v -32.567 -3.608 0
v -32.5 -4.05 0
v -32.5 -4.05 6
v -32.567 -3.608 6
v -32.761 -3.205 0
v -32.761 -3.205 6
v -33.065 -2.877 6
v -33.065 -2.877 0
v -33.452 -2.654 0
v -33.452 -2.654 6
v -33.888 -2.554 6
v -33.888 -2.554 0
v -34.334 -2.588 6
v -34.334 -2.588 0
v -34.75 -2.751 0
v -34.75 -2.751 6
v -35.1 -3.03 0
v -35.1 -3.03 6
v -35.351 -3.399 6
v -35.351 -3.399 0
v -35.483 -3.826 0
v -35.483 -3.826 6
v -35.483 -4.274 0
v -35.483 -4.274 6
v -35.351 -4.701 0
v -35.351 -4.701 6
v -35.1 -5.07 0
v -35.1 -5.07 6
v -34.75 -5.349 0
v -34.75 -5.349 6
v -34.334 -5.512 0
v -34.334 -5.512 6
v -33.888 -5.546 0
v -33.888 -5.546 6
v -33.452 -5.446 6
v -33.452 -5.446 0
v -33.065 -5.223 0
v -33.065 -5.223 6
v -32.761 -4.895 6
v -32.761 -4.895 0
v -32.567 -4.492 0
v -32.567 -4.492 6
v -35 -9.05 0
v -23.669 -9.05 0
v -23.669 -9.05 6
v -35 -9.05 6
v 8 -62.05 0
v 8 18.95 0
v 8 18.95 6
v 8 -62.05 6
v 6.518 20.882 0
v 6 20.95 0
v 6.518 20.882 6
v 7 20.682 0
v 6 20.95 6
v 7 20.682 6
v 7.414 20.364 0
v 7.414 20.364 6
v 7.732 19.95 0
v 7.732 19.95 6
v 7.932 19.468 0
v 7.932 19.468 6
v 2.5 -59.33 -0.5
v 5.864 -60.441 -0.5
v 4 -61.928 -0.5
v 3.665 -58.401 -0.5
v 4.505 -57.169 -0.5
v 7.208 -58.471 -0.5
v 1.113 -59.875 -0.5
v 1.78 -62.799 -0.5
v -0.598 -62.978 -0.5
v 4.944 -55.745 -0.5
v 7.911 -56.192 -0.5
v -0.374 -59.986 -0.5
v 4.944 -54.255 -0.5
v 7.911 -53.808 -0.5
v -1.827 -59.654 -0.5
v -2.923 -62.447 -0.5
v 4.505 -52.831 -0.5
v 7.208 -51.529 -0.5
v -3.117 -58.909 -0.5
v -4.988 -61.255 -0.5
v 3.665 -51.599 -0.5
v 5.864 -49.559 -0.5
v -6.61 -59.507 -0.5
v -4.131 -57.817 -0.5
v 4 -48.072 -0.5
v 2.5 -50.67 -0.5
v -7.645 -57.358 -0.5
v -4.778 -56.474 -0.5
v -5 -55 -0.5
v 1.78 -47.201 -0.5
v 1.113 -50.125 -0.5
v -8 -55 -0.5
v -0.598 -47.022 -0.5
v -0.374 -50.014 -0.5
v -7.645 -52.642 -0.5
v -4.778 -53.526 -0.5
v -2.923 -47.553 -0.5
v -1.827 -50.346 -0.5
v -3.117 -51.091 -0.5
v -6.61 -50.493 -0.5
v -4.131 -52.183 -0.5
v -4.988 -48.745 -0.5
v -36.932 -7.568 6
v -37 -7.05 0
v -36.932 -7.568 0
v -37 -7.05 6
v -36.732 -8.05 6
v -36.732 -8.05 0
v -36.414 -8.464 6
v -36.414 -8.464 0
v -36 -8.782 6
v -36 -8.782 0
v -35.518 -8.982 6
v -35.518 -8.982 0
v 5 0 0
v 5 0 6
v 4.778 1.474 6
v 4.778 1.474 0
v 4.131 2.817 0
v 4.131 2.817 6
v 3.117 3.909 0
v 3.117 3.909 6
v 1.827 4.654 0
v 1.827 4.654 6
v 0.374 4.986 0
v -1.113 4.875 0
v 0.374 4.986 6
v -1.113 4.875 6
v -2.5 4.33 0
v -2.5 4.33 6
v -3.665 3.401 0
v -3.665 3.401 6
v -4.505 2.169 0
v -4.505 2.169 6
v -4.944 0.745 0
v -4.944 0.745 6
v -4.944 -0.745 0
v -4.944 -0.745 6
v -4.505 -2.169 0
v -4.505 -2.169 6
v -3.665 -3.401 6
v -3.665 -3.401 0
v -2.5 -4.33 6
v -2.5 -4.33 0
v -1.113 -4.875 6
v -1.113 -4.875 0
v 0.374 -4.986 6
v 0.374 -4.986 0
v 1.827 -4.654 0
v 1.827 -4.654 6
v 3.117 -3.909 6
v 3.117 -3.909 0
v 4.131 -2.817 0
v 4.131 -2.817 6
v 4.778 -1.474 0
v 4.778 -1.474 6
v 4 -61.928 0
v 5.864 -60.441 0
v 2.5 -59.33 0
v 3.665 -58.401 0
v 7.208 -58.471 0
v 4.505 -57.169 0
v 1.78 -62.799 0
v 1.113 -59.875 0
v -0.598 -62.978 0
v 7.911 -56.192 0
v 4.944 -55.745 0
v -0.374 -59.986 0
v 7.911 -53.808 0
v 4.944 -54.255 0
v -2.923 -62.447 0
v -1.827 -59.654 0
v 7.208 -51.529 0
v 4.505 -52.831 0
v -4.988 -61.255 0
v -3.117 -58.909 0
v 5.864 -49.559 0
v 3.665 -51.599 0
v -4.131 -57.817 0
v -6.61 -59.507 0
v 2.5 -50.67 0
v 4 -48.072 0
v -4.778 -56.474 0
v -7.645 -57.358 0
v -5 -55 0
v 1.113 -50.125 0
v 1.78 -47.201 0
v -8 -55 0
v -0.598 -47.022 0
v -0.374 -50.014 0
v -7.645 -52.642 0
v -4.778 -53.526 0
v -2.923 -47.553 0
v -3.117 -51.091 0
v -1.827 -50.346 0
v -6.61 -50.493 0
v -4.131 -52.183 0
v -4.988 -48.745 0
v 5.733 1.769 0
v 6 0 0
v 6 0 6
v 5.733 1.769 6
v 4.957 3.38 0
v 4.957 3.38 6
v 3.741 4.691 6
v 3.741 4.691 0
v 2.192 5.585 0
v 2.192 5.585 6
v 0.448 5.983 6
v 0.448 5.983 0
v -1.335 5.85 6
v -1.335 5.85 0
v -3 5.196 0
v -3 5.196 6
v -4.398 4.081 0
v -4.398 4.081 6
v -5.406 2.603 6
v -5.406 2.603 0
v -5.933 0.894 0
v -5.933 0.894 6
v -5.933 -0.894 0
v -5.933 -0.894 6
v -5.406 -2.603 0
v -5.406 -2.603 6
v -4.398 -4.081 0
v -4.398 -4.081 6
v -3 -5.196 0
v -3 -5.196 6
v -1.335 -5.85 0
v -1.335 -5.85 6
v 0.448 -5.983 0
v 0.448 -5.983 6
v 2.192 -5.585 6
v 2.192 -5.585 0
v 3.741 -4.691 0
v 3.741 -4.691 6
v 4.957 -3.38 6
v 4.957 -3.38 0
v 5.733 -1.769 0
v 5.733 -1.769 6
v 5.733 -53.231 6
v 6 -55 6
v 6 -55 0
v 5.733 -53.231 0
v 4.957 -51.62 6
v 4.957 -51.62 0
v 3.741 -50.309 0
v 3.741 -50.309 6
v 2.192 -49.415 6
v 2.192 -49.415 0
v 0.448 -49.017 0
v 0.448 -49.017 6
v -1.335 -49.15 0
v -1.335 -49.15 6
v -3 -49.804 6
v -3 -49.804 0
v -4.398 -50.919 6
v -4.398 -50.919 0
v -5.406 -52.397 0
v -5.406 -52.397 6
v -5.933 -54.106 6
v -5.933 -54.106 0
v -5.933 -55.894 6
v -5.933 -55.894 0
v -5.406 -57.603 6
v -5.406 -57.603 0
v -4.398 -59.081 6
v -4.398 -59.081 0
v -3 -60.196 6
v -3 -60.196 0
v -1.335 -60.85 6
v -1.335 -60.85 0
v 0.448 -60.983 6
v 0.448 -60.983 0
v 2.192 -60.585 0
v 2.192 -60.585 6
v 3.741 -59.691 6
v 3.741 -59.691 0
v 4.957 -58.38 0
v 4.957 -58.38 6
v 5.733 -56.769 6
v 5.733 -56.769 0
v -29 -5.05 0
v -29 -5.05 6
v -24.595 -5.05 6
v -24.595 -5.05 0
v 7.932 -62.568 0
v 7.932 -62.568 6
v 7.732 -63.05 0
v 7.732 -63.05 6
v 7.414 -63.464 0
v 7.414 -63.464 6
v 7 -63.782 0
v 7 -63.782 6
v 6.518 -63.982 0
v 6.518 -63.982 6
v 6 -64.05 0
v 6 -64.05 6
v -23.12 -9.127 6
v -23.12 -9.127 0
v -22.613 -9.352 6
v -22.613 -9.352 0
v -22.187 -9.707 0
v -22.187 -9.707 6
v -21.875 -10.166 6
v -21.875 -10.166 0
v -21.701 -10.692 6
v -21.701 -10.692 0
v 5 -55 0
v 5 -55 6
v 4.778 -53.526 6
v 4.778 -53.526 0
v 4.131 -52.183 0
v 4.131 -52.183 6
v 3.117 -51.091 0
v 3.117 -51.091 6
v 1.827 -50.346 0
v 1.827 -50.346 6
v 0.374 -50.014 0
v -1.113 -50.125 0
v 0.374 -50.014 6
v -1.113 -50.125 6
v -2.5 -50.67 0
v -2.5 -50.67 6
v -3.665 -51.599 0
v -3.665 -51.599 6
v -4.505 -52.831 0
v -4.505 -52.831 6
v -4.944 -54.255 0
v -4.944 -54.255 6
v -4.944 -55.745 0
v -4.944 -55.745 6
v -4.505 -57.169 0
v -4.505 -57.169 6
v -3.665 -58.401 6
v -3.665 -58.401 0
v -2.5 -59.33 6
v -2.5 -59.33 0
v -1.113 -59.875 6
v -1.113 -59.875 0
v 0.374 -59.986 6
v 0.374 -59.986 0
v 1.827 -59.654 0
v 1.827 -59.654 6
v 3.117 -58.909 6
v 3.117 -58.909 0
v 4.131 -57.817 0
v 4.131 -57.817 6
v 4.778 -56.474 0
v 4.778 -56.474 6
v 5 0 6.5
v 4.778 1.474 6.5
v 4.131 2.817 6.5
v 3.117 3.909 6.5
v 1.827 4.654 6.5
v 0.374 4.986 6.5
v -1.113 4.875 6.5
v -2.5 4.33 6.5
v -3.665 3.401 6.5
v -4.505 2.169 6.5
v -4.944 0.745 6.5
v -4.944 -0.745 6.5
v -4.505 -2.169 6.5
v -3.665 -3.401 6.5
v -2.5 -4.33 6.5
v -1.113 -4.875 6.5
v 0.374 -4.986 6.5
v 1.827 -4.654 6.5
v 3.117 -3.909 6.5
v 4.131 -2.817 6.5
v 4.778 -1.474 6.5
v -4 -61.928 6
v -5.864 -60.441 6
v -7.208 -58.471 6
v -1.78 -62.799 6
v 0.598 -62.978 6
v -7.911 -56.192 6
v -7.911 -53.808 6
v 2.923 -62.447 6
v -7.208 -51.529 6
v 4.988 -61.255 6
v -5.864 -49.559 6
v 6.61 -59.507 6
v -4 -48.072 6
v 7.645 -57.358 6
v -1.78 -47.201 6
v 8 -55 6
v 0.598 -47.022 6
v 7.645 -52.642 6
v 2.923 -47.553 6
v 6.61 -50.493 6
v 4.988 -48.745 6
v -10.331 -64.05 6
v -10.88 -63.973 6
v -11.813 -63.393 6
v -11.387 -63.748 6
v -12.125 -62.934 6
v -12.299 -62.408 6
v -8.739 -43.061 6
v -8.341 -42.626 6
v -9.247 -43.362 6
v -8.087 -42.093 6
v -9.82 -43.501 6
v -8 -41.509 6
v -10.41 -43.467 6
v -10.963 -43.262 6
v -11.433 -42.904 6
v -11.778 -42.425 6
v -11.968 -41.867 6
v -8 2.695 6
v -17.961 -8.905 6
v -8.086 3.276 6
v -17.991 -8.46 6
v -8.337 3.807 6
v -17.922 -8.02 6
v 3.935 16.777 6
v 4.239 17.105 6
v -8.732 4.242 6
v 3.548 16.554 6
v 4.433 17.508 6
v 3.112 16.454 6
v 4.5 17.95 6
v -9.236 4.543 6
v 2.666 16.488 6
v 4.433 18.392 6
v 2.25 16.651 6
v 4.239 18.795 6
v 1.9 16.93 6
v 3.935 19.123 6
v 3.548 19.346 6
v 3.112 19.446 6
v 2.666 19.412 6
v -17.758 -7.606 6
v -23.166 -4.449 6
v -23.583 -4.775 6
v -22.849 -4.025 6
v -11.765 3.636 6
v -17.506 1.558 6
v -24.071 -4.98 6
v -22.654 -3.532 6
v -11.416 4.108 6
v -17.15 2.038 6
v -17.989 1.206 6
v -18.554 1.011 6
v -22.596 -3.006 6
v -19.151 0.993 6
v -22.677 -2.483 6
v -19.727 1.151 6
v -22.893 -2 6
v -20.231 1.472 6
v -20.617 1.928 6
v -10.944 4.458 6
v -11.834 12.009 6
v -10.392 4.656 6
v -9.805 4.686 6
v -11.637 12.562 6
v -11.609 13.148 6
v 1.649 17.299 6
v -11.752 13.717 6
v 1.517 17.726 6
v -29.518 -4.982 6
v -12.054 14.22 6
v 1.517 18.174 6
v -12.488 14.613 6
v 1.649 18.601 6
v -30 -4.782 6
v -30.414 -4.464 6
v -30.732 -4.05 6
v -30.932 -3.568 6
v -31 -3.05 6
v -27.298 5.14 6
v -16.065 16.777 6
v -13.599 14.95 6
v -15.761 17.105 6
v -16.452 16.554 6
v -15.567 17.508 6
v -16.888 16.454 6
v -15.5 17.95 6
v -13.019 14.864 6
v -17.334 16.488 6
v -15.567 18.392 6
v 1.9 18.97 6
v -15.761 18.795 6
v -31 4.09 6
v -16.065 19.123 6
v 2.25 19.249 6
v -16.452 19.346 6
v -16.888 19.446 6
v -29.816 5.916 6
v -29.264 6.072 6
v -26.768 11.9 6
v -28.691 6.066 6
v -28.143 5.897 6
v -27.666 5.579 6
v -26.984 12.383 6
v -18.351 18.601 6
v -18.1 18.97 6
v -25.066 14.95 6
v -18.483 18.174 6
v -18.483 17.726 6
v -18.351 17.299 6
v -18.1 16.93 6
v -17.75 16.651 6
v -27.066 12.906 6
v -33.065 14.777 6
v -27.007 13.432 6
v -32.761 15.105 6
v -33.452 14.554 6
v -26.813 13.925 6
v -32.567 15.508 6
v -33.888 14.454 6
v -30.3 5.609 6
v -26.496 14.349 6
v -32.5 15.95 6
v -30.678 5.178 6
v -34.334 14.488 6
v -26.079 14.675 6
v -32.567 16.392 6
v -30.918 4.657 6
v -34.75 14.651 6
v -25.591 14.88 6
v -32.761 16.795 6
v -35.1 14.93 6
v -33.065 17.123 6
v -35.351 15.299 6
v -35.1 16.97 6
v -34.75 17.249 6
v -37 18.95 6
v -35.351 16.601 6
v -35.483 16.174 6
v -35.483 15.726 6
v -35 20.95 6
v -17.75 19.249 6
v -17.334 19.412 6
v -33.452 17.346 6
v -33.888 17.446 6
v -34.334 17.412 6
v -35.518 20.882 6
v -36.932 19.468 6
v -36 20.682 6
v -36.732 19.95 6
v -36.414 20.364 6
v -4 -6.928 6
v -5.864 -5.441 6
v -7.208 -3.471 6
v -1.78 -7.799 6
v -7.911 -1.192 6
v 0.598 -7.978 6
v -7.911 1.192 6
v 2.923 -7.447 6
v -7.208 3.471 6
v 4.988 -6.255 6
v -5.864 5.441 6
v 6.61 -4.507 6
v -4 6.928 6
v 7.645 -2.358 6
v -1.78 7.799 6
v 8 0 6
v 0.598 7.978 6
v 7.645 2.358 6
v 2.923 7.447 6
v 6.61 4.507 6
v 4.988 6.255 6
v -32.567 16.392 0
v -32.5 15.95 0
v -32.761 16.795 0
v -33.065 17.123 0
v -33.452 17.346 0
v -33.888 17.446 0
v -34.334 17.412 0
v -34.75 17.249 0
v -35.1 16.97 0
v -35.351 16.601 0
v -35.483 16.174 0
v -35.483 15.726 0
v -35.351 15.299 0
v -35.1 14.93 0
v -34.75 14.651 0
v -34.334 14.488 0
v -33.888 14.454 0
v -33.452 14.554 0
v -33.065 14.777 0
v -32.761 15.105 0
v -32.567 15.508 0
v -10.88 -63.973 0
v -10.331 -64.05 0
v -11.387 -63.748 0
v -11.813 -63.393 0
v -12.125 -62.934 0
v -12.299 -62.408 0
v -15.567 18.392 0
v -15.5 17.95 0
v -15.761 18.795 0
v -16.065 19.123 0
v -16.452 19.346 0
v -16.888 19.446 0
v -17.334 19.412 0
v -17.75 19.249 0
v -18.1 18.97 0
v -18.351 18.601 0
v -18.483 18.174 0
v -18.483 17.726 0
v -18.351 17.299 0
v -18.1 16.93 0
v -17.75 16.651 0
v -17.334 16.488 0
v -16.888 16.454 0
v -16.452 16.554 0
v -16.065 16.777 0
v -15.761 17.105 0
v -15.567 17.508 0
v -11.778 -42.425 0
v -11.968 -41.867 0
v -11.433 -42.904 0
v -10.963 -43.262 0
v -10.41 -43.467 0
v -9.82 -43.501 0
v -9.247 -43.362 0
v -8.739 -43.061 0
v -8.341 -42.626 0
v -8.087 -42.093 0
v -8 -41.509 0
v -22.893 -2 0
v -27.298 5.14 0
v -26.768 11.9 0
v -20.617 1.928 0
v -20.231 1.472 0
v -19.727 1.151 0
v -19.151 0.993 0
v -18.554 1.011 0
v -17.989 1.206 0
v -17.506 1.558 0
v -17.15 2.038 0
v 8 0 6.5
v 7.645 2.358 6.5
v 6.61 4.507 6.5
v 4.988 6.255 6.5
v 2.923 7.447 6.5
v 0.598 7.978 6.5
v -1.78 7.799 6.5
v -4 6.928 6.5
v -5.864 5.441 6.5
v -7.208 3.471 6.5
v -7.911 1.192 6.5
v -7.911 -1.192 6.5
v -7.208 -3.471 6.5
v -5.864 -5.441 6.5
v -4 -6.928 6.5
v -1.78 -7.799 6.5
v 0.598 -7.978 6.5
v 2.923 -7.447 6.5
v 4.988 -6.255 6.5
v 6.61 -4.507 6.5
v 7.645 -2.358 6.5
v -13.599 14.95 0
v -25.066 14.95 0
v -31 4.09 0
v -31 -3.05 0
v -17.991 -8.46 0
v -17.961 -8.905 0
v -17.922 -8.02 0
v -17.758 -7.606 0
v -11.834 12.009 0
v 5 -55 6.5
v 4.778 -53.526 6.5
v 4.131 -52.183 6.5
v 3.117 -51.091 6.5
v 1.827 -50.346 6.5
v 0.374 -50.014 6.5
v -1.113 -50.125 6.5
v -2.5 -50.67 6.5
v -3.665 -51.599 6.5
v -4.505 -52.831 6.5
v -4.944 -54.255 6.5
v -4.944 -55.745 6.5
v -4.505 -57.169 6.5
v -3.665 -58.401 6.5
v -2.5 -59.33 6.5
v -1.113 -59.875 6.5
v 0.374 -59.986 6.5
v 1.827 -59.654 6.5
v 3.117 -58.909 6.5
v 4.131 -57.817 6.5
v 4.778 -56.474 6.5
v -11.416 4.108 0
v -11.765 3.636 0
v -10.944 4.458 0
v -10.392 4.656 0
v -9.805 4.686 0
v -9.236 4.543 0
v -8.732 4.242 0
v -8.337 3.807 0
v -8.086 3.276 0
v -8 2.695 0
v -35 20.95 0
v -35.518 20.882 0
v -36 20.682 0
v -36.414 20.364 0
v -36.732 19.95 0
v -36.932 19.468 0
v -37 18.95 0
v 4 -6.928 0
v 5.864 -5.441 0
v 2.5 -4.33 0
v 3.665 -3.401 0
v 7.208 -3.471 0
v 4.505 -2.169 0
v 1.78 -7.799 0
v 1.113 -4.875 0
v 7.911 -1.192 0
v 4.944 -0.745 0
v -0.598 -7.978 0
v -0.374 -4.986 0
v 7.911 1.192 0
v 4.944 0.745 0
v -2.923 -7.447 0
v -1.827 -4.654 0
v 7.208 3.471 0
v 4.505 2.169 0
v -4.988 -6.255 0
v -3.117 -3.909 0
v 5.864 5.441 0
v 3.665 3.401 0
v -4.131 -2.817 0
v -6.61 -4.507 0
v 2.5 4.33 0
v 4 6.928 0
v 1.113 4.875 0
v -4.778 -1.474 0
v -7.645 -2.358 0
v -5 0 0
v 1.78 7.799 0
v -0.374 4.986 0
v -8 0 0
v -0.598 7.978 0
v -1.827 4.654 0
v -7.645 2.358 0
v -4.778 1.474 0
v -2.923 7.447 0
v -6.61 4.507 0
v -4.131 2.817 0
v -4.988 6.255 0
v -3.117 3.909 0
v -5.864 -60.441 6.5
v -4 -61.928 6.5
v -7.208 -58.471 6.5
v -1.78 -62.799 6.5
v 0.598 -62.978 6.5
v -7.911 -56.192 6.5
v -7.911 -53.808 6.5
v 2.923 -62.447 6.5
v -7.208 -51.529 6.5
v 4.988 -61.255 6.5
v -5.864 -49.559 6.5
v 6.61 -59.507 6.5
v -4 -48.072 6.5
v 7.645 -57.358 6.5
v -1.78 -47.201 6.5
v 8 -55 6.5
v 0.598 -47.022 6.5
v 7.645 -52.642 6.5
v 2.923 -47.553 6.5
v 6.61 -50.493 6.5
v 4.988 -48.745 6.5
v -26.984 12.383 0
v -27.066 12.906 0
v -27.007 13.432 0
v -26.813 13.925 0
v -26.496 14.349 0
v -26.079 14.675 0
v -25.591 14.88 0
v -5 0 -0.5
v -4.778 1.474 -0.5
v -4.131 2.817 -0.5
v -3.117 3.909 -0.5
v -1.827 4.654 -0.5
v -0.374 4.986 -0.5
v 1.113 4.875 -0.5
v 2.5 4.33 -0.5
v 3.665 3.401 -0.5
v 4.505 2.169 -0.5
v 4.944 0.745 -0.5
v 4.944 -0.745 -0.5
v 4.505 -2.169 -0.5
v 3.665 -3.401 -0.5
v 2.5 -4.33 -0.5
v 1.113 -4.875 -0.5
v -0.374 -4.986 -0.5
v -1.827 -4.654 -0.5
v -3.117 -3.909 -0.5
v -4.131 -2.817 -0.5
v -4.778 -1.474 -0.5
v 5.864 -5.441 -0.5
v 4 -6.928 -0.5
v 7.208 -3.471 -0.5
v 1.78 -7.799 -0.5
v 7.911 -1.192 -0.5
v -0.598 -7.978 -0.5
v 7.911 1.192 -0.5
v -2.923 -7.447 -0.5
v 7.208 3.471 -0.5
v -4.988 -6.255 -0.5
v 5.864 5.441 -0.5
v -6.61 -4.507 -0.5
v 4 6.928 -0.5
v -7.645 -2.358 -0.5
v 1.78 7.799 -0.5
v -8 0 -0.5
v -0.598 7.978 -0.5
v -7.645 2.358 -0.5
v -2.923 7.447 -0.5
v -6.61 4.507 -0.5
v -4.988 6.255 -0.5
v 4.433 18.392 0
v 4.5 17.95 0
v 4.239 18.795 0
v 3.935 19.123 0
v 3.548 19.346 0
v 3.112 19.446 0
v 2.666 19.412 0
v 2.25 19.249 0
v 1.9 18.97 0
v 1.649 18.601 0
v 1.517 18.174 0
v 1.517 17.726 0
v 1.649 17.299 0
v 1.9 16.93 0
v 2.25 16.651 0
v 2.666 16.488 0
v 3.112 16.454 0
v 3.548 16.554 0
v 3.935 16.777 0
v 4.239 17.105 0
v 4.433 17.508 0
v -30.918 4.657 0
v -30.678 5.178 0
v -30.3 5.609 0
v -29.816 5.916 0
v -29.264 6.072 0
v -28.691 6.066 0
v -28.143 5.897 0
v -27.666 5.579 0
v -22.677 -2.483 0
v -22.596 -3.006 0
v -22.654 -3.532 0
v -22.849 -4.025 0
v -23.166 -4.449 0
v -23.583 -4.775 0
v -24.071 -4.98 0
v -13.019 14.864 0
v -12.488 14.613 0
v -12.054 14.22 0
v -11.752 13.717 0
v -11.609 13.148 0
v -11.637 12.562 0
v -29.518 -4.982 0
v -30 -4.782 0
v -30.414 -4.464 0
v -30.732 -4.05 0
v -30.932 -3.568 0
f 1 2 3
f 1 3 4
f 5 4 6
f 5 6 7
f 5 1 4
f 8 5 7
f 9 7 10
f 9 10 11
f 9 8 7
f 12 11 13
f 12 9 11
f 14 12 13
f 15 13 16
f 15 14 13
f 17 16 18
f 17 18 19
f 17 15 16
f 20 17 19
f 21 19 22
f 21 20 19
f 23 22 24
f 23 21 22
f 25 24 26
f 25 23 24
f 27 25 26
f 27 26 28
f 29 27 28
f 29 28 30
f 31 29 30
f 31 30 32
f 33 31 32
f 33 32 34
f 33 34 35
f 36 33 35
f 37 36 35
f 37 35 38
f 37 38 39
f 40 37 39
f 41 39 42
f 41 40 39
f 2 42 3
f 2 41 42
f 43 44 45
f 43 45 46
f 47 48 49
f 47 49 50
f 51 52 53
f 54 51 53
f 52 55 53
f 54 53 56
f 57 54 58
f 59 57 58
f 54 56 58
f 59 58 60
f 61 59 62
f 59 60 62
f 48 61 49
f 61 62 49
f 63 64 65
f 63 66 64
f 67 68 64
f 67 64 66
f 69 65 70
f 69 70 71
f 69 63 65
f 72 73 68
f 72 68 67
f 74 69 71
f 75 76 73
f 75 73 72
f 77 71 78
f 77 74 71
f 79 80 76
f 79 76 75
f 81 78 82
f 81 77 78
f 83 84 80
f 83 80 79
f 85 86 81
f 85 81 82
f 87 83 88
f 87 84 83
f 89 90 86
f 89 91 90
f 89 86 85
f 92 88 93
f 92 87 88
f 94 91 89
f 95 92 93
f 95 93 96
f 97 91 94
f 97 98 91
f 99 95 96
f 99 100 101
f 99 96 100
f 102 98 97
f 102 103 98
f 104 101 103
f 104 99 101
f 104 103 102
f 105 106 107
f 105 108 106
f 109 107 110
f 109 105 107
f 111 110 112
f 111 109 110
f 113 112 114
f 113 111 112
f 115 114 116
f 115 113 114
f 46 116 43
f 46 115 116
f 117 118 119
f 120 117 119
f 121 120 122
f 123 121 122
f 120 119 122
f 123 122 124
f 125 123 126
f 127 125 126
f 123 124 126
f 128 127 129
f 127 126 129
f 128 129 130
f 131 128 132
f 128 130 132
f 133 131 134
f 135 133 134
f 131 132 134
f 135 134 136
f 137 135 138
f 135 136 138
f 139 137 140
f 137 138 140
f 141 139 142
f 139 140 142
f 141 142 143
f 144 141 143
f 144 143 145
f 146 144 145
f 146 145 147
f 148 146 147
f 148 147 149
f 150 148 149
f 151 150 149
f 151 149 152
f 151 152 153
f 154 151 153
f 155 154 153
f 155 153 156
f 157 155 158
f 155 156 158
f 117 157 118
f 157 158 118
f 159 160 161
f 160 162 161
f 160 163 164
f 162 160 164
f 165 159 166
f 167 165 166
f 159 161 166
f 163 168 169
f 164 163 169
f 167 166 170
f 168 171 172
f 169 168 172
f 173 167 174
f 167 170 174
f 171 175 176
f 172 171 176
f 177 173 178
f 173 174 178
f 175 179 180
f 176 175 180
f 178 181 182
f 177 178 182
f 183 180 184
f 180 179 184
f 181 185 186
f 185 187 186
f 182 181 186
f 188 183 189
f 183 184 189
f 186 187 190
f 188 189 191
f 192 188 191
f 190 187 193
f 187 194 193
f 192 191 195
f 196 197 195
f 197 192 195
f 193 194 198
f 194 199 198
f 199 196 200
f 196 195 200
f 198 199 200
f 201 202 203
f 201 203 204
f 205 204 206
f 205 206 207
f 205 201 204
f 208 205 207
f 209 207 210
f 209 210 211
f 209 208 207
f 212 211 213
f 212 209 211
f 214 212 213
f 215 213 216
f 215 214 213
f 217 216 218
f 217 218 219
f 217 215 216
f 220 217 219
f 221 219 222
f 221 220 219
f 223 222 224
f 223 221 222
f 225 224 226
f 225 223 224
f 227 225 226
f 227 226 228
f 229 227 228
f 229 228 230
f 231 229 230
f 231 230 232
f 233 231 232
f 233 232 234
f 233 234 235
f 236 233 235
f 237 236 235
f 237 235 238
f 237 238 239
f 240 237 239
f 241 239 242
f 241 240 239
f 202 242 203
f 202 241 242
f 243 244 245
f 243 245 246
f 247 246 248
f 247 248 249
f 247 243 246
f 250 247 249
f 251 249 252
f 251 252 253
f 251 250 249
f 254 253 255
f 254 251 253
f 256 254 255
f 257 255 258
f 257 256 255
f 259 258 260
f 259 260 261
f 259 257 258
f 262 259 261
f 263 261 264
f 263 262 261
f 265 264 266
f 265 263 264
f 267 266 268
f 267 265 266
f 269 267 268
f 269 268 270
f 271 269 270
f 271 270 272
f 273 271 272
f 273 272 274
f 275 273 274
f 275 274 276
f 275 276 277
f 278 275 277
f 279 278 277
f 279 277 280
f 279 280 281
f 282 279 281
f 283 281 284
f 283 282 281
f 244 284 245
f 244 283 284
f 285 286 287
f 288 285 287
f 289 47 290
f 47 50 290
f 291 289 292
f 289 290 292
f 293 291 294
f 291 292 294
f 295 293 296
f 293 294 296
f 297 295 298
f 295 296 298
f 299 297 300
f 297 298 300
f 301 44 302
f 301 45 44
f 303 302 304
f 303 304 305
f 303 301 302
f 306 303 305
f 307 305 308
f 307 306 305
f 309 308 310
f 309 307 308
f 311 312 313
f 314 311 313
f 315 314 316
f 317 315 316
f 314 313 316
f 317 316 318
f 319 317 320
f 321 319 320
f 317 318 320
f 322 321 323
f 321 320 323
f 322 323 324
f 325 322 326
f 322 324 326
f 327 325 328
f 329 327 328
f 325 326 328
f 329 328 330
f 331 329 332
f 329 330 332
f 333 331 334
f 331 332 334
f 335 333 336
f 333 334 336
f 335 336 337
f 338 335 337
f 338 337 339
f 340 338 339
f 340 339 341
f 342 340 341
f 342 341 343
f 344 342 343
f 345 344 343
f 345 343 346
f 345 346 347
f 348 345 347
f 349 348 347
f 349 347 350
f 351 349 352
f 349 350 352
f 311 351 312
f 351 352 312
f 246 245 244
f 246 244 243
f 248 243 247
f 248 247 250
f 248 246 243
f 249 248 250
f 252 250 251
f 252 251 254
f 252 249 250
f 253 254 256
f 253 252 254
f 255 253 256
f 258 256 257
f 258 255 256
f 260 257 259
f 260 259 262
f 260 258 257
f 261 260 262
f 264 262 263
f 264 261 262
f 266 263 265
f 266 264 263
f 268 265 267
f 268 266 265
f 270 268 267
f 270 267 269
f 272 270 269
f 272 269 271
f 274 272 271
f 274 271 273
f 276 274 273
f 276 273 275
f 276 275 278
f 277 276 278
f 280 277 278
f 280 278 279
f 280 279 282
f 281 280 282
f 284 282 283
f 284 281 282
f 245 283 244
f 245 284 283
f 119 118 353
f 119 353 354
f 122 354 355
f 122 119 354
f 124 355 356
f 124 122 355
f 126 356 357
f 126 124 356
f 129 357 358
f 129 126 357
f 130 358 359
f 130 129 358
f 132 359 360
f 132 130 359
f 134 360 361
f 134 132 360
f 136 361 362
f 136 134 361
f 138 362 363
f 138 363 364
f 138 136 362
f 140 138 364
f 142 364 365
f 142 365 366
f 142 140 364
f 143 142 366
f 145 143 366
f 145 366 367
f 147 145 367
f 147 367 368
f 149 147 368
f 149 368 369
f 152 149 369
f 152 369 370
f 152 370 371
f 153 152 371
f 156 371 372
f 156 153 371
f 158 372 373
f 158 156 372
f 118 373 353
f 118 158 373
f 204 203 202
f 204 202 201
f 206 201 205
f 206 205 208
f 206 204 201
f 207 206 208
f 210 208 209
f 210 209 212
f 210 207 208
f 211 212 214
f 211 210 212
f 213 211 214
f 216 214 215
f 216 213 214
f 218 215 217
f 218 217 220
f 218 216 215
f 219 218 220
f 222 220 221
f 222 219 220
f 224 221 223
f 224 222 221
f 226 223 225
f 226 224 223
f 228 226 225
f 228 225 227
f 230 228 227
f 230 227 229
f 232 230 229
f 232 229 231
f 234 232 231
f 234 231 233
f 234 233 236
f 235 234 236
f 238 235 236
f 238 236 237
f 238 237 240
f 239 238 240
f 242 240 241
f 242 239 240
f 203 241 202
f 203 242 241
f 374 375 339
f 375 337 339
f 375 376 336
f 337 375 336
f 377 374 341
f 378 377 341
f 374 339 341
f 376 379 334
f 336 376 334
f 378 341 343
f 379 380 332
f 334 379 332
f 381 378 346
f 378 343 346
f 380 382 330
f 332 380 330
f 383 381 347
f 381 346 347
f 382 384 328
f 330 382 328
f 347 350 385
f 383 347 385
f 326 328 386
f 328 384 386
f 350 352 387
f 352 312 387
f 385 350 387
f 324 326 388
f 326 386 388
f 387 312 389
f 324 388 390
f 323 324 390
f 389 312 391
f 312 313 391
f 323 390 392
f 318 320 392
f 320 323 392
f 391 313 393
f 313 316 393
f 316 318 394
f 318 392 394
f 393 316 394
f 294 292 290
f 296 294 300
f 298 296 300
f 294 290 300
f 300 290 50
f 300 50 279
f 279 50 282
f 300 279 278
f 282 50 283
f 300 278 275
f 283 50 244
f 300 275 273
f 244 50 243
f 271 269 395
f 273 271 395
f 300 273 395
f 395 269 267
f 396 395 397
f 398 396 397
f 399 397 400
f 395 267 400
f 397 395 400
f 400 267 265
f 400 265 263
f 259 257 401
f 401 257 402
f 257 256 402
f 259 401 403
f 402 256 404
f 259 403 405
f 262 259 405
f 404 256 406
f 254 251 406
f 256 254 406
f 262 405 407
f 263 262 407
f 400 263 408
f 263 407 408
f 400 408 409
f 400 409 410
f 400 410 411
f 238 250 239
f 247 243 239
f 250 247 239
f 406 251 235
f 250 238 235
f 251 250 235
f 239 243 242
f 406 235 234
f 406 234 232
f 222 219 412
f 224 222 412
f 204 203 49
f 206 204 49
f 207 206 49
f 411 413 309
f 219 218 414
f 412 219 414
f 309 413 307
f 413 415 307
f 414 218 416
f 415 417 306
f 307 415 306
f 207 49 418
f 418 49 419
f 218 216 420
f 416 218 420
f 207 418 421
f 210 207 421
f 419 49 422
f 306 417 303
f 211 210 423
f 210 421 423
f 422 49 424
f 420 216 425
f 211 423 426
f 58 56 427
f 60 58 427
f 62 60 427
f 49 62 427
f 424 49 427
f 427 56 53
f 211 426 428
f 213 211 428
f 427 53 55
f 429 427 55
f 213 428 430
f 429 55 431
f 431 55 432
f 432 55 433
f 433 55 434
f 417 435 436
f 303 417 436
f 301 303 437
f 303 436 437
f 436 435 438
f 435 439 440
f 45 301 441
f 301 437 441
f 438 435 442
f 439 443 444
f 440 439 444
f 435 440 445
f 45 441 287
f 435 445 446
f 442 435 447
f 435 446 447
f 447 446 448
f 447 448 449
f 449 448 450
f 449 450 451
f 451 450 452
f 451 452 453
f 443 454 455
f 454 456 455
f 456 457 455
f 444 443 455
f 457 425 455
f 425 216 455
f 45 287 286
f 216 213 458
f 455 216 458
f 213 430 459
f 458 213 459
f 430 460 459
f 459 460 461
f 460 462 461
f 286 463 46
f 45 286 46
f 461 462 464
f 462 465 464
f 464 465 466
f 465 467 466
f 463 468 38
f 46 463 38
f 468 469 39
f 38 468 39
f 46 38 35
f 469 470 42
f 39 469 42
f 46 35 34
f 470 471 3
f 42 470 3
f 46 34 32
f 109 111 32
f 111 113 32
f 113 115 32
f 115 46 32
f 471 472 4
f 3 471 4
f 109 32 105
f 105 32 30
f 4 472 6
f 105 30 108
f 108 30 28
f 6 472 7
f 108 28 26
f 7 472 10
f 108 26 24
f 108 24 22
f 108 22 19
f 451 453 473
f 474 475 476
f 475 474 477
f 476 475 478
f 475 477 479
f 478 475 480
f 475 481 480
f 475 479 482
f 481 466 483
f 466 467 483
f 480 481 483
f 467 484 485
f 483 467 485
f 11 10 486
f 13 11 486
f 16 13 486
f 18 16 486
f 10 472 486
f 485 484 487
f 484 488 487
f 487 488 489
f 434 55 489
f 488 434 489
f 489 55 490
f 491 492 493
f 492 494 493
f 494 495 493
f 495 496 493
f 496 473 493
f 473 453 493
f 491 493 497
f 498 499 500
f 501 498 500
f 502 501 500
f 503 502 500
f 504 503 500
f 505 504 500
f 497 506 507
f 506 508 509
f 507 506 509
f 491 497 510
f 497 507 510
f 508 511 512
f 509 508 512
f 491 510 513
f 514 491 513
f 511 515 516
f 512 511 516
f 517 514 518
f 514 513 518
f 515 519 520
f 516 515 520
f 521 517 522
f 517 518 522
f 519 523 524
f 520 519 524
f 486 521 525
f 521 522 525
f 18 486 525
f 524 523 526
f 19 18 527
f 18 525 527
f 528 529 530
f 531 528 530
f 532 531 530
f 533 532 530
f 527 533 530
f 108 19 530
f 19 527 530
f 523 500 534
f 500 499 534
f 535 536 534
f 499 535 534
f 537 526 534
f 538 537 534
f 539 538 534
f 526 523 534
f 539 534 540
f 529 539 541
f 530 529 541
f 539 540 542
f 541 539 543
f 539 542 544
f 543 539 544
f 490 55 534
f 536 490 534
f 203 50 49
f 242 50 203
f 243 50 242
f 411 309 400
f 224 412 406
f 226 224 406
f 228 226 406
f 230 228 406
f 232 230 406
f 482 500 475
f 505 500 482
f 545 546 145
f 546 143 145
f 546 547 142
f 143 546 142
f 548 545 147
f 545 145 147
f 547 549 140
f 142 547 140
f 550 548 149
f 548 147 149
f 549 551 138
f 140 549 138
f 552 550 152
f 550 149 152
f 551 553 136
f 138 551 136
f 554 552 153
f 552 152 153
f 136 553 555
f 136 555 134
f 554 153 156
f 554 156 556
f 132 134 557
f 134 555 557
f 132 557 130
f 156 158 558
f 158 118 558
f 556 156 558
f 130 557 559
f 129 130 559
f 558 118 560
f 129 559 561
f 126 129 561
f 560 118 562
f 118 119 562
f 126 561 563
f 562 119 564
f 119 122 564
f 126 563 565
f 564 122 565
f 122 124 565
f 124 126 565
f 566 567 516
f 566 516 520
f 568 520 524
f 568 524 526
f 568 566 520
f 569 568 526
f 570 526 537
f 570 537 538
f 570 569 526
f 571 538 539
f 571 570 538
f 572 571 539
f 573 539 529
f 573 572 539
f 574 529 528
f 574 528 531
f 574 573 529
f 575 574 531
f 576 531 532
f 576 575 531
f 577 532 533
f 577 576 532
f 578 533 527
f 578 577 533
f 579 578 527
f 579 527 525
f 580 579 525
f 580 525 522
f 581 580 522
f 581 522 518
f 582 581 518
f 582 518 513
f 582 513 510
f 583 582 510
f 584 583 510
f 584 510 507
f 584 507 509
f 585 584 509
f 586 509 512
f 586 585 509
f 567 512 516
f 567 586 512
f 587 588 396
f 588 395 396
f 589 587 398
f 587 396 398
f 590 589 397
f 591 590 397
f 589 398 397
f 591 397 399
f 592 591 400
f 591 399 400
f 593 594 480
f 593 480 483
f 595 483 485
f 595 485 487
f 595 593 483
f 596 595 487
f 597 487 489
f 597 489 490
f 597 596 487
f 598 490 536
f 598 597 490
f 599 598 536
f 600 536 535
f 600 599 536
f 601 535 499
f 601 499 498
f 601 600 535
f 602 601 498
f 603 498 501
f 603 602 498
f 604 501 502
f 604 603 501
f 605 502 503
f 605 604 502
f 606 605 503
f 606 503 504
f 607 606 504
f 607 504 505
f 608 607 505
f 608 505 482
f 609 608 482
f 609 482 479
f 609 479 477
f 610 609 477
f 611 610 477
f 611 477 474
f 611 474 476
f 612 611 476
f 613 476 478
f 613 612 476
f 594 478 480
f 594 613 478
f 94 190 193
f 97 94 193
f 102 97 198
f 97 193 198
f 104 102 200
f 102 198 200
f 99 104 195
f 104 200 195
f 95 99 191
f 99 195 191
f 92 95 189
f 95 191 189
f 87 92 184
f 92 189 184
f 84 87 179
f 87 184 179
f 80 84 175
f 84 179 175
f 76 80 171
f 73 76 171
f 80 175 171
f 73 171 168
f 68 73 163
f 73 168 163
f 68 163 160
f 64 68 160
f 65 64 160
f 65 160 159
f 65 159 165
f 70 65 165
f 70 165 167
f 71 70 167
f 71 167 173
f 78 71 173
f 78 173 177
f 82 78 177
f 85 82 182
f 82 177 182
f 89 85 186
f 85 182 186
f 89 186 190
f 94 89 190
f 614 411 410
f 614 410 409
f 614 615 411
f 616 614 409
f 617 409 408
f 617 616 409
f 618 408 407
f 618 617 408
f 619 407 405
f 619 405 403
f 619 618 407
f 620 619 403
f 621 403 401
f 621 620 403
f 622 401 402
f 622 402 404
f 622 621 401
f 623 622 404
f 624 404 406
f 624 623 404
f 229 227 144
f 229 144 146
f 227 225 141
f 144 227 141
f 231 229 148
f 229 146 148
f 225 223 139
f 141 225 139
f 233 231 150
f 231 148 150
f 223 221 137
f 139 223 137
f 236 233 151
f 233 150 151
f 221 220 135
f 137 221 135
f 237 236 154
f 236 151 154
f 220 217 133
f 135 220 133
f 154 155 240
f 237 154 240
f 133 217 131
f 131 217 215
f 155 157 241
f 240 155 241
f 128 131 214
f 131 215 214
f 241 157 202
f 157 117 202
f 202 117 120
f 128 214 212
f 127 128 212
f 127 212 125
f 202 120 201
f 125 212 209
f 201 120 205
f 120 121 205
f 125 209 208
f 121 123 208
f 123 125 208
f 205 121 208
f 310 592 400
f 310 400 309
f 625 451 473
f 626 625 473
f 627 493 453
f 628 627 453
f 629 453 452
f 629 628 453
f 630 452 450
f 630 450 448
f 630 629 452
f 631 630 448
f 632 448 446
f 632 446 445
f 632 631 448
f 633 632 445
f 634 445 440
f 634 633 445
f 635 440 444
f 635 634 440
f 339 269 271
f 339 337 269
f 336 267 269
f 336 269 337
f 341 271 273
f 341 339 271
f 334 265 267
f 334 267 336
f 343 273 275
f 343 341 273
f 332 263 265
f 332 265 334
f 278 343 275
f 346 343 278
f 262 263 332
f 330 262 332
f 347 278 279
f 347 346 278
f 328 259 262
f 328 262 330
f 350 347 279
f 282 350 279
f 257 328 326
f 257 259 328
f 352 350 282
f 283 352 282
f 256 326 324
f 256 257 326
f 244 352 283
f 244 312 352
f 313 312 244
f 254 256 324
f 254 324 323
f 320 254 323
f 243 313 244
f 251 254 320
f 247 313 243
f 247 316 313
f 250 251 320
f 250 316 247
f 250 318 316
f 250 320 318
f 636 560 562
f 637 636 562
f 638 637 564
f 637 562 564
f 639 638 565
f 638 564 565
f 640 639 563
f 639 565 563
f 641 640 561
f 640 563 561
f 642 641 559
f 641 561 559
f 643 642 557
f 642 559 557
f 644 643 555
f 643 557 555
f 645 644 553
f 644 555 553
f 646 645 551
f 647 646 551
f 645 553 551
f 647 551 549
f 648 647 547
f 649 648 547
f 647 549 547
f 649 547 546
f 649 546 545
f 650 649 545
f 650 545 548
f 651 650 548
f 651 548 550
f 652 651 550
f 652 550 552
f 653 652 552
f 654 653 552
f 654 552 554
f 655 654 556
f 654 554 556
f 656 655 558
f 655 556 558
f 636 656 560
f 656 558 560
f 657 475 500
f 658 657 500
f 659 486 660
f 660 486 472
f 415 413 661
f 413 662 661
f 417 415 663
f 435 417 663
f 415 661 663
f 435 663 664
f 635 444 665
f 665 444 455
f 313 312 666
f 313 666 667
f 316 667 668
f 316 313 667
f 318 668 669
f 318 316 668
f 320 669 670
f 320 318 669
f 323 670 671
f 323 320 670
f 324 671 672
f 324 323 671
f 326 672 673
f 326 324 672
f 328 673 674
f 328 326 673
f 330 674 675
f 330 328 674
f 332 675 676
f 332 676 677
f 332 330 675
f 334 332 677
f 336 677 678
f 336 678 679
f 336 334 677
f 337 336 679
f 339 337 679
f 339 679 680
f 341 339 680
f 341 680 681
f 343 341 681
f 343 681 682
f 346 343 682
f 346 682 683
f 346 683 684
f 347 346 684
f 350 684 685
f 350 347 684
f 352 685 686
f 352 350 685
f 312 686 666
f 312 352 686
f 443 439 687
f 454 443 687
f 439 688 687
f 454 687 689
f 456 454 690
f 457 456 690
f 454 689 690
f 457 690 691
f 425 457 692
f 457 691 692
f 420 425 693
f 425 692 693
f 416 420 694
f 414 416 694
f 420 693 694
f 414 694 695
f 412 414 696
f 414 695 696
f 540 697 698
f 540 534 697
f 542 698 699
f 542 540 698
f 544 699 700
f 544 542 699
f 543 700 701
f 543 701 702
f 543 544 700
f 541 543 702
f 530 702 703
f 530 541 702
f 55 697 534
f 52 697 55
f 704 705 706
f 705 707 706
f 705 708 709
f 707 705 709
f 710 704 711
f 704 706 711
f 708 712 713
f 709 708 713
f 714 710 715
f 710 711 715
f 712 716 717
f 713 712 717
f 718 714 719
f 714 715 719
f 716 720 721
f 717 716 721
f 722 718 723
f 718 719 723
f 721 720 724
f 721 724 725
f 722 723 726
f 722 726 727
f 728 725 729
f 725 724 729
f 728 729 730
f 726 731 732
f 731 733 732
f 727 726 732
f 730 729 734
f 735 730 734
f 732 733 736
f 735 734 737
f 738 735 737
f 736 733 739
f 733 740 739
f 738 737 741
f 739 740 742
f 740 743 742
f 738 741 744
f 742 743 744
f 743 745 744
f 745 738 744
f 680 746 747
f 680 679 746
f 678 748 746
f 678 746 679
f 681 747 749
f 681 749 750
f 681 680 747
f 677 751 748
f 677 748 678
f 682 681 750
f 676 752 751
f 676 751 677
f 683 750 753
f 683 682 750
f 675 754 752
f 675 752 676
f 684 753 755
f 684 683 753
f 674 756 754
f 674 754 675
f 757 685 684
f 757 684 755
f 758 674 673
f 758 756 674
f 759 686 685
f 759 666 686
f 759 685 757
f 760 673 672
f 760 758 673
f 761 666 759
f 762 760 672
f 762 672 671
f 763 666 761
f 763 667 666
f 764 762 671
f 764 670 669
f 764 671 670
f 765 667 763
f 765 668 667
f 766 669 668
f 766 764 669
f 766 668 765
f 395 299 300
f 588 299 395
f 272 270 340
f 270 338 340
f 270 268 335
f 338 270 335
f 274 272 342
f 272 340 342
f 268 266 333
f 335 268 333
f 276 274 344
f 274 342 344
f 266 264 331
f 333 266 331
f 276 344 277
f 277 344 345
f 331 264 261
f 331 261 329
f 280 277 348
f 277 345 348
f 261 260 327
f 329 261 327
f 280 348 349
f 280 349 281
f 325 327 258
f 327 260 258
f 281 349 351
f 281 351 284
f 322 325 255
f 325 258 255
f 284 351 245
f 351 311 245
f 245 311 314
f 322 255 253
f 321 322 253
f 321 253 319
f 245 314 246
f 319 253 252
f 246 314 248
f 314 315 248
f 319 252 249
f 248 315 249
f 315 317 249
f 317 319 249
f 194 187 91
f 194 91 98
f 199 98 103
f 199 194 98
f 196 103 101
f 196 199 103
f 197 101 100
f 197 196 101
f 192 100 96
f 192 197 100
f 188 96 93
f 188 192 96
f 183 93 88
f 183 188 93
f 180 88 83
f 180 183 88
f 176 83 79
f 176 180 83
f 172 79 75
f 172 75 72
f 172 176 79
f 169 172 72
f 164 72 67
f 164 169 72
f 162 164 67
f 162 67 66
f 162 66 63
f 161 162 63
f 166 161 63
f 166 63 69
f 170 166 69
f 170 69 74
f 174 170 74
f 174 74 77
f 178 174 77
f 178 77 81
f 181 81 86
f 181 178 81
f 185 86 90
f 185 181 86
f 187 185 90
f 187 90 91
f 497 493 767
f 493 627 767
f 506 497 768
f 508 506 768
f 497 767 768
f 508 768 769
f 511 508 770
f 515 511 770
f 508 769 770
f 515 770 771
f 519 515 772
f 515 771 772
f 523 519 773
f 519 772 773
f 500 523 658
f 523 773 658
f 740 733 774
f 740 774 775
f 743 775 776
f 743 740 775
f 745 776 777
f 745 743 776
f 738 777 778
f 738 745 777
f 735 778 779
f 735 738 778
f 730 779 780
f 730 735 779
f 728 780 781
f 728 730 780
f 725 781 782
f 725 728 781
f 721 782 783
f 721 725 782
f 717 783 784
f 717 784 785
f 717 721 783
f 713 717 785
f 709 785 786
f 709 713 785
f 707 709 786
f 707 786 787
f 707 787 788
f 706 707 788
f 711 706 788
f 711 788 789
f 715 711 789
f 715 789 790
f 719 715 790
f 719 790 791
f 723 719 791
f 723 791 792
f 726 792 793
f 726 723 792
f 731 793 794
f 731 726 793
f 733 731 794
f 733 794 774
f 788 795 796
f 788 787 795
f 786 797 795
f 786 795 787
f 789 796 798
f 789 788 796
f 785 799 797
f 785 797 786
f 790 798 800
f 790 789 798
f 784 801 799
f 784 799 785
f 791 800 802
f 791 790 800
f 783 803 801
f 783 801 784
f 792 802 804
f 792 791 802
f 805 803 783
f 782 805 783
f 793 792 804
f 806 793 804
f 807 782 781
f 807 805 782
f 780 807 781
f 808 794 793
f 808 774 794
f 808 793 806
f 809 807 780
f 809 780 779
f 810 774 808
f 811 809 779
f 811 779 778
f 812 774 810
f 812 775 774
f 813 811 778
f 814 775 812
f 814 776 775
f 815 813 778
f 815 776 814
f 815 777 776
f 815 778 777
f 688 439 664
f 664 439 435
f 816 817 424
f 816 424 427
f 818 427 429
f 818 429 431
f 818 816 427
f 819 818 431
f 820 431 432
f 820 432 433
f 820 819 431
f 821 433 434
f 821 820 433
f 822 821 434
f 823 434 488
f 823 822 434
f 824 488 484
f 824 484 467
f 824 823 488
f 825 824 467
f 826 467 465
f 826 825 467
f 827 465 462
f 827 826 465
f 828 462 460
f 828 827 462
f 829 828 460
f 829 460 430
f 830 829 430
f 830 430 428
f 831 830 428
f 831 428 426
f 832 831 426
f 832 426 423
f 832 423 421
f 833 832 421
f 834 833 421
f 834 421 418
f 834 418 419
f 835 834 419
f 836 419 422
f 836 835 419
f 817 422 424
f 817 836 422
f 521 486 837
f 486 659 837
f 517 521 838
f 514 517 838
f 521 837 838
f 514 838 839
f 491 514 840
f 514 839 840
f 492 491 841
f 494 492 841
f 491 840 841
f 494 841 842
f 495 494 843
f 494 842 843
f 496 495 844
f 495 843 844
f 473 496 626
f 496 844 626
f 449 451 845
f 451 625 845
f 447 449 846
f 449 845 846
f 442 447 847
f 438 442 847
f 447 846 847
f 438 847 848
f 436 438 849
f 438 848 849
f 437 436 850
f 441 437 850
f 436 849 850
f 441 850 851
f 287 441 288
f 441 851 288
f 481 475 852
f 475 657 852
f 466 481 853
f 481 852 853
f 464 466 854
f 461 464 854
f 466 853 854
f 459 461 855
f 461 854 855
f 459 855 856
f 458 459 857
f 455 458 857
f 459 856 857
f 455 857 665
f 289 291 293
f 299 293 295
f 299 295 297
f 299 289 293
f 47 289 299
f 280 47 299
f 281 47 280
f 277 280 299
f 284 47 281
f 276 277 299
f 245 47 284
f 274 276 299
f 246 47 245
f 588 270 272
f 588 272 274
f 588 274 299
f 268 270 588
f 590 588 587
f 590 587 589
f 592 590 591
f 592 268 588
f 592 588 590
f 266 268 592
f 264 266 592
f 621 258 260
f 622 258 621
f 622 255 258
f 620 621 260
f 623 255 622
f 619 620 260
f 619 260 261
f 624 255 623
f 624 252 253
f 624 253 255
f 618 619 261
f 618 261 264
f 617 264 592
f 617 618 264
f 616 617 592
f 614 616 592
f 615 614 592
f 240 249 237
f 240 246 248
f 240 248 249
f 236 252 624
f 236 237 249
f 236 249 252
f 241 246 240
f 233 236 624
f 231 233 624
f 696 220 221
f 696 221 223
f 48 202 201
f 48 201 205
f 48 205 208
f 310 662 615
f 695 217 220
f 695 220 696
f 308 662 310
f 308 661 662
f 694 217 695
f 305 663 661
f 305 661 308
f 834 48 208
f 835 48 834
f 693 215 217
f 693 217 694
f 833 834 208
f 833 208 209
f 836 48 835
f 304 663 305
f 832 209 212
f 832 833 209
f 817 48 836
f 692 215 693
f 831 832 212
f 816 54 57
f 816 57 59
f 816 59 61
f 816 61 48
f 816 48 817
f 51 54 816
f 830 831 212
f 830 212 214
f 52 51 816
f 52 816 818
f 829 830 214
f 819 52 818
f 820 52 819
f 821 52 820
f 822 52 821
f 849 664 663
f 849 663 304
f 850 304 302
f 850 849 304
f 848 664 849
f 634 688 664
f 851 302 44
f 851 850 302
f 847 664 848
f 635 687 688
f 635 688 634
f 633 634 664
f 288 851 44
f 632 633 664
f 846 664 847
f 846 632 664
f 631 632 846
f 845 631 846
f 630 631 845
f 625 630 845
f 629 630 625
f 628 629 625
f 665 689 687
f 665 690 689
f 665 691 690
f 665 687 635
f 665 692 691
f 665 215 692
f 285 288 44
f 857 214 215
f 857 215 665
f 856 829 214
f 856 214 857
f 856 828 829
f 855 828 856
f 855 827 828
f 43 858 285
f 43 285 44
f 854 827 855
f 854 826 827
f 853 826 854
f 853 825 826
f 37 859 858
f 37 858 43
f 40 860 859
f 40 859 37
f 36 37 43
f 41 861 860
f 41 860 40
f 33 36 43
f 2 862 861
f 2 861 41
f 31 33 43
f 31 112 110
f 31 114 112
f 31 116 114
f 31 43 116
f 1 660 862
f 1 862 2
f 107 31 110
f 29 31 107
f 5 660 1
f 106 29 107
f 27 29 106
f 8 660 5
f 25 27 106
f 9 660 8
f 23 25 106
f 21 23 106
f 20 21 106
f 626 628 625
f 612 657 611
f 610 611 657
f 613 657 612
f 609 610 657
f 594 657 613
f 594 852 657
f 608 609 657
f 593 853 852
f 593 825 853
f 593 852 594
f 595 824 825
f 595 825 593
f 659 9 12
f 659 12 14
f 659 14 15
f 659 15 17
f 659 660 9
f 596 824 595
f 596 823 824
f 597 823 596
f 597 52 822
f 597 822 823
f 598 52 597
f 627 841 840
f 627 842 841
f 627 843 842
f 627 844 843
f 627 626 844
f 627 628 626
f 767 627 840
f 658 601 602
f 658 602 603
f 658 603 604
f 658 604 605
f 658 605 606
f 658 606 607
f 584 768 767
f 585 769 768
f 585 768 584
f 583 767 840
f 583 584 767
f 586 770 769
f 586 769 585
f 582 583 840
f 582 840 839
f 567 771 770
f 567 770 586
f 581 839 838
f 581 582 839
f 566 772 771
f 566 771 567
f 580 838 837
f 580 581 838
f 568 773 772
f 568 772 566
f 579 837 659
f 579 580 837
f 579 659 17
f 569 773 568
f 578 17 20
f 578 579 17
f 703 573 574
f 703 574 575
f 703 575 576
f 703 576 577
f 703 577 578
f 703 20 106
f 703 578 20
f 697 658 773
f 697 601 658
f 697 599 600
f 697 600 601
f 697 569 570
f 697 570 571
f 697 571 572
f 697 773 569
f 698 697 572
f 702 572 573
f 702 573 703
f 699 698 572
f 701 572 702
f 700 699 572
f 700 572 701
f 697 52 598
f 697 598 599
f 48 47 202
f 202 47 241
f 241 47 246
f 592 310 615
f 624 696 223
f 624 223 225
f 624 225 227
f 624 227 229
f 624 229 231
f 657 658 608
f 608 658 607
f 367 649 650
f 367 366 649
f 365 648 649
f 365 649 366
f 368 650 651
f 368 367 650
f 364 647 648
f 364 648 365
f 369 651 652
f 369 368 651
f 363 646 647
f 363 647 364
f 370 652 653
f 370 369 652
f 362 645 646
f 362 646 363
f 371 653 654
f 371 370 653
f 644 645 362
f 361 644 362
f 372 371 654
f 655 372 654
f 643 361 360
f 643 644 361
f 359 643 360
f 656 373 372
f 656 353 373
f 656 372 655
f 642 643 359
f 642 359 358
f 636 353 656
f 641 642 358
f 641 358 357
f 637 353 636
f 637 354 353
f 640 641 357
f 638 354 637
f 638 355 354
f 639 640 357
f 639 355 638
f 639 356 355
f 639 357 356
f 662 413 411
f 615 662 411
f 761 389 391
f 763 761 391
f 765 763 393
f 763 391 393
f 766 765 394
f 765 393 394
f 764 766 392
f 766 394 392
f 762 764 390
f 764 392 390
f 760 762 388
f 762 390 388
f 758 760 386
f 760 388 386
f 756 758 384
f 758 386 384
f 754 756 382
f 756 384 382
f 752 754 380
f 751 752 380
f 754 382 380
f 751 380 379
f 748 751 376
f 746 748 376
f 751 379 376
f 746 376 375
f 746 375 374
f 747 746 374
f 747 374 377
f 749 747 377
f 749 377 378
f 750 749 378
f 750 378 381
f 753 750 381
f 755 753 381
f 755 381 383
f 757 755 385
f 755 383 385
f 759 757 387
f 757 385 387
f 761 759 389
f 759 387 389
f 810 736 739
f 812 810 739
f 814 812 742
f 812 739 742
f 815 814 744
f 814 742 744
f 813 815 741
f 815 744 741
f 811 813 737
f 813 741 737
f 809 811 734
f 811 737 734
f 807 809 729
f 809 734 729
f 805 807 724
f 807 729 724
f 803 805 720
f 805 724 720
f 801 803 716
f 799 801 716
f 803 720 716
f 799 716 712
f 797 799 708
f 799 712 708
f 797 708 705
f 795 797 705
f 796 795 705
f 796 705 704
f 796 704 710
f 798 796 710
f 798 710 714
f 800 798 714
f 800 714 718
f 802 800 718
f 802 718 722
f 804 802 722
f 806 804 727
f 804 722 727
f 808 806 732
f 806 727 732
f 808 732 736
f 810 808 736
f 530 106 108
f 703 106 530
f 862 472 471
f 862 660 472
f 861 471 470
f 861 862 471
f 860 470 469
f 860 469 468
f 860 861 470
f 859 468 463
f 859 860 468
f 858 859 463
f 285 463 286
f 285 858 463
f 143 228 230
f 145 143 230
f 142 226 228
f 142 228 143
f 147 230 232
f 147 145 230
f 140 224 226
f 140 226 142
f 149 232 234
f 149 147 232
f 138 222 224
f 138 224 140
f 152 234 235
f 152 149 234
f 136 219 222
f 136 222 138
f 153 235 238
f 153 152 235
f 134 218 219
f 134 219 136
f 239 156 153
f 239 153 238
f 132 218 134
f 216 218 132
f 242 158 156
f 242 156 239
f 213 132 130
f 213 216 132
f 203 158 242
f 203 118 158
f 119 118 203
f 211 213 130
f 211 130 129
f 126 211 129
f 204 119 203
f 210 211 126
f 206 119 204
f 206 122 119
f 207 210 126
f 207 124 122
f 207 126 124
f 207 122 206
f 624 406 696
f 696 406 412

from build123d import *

# Parameters (mm, degrees)
SKETCH_1_R          = 6
SKETCH_1_R_2        = 1.5
EXTRUDE_1_DEPTH     = 6
SKETCH_2_R          = 6
SKETCH_2_R_2        = 5
EXTRUDE_2_DEPTH     = 6
EXTRUDE_2_2_DEPTH   = 6
CUT_EXTRUDE_1_DEPTH = 6
FILLET_2_R          = 2
SKETCH_4_R          = 8
SKETCH_4_R_2        = 5
EXTRUDE_3_DEPTH     = 0.5
EXTRUDE_3_2_DEPTH   = 0.5
SKETCH_5_R          = 8
SKETCH_5_R_2        = 5
EXTRUDE_4_DEPTH     = 0.5
EXTRUDE_4_2_DEPTH   = 0.5


with BuildPart() as part:
    # 草图1 → 凸台-拉伸1 (new body)
    with BuildSketch(Plane.XY):
        Polygon((-37, 20.95), (8, 20.95), (8, -64.05), (-12, -64.05), (-22, -9.05), (-37, -9.05), align=None)
        Circle(SKETCH_1_R, mode=Mode.SUBTRACT)
        with Locations((0, -55)):
            Circle(SKETCH_1_R, mode=Mode.SUBTRACT)
        with Locations((3, 17.95)):
            Circle(SKETCH_1_R_2, mode=Mode.SUBTRACT)
        with Locations((-17, 17.95)):
            Circle(SKETCH_1_R_2, mode=Mode.SUBTRACT)
        with Locations((-34, 15.95)):
            Circle(SKETCH_1_R_2, mode=Mode.SUBTRACT)
        with Locations((-34, -4.05)):
            Circle(SKETCH_1_R_2, mode=Mode.SUBTRACT)
    extrude(amount=EXTRUDE_1_DEPTH)

    # 草图3 → 切除-拉伸1 (cut)
    with BuildSketch(Plane.XY.offset(6)):
        Polygon((-8, -63.689320225), (-8, 10.698456851), (-18.085282501, -8.220266471), align=None)
        Polygon((-18.788186972, -1.035740679), (-10.266432729, 14.95), (-28.65003451, 14.95), align=None)
        Polygon((-31, -5.05), (-21.011660076, -5.05), (-31, 11.140780806), align=None)
    extrude(amount=-CUT_EXTRUDE_1_DEPTH, mode=Mode.SUBTRACT)

    # 圆角2
    fillet_2_edges = [part.edges().sort_by_distance(p)[0] for p in [
        (8, -64.05, 3),
        (-12, -64.05, 3),
        (-22, -9.05, 3),
        (-37, -9.05, 3),
        (-37, 20.95, 3),
        (8, 20.95, 3),
        (-10.266432729, 14.95, 3),
        (-28.65003451, 14.95, 3),
        (-18.788186972, -1.035740679, 3),
        (-31, 11.140780806, 3),
        (-21.011660076, -5.05, 3),
        (-31, -5.05, 3),
        (-18.085282501, -8.220266471, 3),
        (-8, -63.689320225, 3),
        (-8, 10.698456851, 3),
    ]]
    fillet(fillet_2_edges, radius=FILLET_2_R)


with BuildPart() as body_2:
    # 草图2 → 凸台-拉伸2 (new body)
    with BuildSketch(Plane.XY.offset(6)):
        with Locations((0, -55)):
            Circle(SKETCH_2_R)
        with Locations((0, -55)):
            Circle(SKETCH_2_R_2, mode=Mode.SUBTRACT)
    extrude(amount=-EXTRUDE_2_DEPTH)


with BuildPart() as body_3:
    # 草图2 → Extrude 2 2 (new body)
    with BuildSketch(Plane.XY.offset(6)):
        Circle(SKETCH_2_R)
        Circle(SKETCH_2_R_2, mode=Mode.SUBTRACT)
    extrude(amount=-EXTRUDE_2_2_DEPTH)


with BuildPart() as body_4:
    # 草图4 → 凸台-拉伸3 (new body)
    with BuildSketch(Plane.XY.offset(6)):
        Circle(SKETCH_4_R)
        Circle(SKETCH_4_R_2, mode=Mode.SUBTRACT)
    extrude(amount=EXTRUDE_3_DEPTH)


with BuildPart() as body_5:
    # 草图4 → Extrude 3 2 (new body)
    with BuildSketch(Plane.XY.offset(6)):
        with Locations((0, -55)):
            Circle(SKETCH_4_R)
        with Locations((0, -55)):
            Circle(SKETCH_4_R_2, mode=Mode.SUBTRACT)
    extrude(amount=EXTRUDE_3_2_DEPTH)


with BuildPart() as body_6:
    # 草图5 → 凸台-拉伸4 (new body)
    with BuildSketch(Plane(origin=(0, 0, 0), x_dir=(-1, 0, 0), z_dir=(0, 0, -1))):
        with Locations((0, -55)):
            Circle(SKETCH_5_R)
        with Locations((0, -55)):
            Circle(SKETCH_5_R_2, mode=Mode.SUBTRACT)
    extrude(amount=EXTRUDE_4_DEPTH)


with BuildPart() as body_7:
    # 草图5 → Extrude 4 2 (new body)
    with BuildSketch(Plane(origin=(0, 0, 0), x_dir=(-1, 0, 0), z_dir=(0, 0, -1))):
        Circle(SKETCH_5_R)
        Circle(SKETCH_5_R_2, mode=Mode.SUBTRACT)
    extrude(amount=EXTRUDE_4_2_DEPTH)


solid = Compound([part.part, body_2.part, body_3.part, body_4.part, body_5.part, body_6.part, body_7.part])
